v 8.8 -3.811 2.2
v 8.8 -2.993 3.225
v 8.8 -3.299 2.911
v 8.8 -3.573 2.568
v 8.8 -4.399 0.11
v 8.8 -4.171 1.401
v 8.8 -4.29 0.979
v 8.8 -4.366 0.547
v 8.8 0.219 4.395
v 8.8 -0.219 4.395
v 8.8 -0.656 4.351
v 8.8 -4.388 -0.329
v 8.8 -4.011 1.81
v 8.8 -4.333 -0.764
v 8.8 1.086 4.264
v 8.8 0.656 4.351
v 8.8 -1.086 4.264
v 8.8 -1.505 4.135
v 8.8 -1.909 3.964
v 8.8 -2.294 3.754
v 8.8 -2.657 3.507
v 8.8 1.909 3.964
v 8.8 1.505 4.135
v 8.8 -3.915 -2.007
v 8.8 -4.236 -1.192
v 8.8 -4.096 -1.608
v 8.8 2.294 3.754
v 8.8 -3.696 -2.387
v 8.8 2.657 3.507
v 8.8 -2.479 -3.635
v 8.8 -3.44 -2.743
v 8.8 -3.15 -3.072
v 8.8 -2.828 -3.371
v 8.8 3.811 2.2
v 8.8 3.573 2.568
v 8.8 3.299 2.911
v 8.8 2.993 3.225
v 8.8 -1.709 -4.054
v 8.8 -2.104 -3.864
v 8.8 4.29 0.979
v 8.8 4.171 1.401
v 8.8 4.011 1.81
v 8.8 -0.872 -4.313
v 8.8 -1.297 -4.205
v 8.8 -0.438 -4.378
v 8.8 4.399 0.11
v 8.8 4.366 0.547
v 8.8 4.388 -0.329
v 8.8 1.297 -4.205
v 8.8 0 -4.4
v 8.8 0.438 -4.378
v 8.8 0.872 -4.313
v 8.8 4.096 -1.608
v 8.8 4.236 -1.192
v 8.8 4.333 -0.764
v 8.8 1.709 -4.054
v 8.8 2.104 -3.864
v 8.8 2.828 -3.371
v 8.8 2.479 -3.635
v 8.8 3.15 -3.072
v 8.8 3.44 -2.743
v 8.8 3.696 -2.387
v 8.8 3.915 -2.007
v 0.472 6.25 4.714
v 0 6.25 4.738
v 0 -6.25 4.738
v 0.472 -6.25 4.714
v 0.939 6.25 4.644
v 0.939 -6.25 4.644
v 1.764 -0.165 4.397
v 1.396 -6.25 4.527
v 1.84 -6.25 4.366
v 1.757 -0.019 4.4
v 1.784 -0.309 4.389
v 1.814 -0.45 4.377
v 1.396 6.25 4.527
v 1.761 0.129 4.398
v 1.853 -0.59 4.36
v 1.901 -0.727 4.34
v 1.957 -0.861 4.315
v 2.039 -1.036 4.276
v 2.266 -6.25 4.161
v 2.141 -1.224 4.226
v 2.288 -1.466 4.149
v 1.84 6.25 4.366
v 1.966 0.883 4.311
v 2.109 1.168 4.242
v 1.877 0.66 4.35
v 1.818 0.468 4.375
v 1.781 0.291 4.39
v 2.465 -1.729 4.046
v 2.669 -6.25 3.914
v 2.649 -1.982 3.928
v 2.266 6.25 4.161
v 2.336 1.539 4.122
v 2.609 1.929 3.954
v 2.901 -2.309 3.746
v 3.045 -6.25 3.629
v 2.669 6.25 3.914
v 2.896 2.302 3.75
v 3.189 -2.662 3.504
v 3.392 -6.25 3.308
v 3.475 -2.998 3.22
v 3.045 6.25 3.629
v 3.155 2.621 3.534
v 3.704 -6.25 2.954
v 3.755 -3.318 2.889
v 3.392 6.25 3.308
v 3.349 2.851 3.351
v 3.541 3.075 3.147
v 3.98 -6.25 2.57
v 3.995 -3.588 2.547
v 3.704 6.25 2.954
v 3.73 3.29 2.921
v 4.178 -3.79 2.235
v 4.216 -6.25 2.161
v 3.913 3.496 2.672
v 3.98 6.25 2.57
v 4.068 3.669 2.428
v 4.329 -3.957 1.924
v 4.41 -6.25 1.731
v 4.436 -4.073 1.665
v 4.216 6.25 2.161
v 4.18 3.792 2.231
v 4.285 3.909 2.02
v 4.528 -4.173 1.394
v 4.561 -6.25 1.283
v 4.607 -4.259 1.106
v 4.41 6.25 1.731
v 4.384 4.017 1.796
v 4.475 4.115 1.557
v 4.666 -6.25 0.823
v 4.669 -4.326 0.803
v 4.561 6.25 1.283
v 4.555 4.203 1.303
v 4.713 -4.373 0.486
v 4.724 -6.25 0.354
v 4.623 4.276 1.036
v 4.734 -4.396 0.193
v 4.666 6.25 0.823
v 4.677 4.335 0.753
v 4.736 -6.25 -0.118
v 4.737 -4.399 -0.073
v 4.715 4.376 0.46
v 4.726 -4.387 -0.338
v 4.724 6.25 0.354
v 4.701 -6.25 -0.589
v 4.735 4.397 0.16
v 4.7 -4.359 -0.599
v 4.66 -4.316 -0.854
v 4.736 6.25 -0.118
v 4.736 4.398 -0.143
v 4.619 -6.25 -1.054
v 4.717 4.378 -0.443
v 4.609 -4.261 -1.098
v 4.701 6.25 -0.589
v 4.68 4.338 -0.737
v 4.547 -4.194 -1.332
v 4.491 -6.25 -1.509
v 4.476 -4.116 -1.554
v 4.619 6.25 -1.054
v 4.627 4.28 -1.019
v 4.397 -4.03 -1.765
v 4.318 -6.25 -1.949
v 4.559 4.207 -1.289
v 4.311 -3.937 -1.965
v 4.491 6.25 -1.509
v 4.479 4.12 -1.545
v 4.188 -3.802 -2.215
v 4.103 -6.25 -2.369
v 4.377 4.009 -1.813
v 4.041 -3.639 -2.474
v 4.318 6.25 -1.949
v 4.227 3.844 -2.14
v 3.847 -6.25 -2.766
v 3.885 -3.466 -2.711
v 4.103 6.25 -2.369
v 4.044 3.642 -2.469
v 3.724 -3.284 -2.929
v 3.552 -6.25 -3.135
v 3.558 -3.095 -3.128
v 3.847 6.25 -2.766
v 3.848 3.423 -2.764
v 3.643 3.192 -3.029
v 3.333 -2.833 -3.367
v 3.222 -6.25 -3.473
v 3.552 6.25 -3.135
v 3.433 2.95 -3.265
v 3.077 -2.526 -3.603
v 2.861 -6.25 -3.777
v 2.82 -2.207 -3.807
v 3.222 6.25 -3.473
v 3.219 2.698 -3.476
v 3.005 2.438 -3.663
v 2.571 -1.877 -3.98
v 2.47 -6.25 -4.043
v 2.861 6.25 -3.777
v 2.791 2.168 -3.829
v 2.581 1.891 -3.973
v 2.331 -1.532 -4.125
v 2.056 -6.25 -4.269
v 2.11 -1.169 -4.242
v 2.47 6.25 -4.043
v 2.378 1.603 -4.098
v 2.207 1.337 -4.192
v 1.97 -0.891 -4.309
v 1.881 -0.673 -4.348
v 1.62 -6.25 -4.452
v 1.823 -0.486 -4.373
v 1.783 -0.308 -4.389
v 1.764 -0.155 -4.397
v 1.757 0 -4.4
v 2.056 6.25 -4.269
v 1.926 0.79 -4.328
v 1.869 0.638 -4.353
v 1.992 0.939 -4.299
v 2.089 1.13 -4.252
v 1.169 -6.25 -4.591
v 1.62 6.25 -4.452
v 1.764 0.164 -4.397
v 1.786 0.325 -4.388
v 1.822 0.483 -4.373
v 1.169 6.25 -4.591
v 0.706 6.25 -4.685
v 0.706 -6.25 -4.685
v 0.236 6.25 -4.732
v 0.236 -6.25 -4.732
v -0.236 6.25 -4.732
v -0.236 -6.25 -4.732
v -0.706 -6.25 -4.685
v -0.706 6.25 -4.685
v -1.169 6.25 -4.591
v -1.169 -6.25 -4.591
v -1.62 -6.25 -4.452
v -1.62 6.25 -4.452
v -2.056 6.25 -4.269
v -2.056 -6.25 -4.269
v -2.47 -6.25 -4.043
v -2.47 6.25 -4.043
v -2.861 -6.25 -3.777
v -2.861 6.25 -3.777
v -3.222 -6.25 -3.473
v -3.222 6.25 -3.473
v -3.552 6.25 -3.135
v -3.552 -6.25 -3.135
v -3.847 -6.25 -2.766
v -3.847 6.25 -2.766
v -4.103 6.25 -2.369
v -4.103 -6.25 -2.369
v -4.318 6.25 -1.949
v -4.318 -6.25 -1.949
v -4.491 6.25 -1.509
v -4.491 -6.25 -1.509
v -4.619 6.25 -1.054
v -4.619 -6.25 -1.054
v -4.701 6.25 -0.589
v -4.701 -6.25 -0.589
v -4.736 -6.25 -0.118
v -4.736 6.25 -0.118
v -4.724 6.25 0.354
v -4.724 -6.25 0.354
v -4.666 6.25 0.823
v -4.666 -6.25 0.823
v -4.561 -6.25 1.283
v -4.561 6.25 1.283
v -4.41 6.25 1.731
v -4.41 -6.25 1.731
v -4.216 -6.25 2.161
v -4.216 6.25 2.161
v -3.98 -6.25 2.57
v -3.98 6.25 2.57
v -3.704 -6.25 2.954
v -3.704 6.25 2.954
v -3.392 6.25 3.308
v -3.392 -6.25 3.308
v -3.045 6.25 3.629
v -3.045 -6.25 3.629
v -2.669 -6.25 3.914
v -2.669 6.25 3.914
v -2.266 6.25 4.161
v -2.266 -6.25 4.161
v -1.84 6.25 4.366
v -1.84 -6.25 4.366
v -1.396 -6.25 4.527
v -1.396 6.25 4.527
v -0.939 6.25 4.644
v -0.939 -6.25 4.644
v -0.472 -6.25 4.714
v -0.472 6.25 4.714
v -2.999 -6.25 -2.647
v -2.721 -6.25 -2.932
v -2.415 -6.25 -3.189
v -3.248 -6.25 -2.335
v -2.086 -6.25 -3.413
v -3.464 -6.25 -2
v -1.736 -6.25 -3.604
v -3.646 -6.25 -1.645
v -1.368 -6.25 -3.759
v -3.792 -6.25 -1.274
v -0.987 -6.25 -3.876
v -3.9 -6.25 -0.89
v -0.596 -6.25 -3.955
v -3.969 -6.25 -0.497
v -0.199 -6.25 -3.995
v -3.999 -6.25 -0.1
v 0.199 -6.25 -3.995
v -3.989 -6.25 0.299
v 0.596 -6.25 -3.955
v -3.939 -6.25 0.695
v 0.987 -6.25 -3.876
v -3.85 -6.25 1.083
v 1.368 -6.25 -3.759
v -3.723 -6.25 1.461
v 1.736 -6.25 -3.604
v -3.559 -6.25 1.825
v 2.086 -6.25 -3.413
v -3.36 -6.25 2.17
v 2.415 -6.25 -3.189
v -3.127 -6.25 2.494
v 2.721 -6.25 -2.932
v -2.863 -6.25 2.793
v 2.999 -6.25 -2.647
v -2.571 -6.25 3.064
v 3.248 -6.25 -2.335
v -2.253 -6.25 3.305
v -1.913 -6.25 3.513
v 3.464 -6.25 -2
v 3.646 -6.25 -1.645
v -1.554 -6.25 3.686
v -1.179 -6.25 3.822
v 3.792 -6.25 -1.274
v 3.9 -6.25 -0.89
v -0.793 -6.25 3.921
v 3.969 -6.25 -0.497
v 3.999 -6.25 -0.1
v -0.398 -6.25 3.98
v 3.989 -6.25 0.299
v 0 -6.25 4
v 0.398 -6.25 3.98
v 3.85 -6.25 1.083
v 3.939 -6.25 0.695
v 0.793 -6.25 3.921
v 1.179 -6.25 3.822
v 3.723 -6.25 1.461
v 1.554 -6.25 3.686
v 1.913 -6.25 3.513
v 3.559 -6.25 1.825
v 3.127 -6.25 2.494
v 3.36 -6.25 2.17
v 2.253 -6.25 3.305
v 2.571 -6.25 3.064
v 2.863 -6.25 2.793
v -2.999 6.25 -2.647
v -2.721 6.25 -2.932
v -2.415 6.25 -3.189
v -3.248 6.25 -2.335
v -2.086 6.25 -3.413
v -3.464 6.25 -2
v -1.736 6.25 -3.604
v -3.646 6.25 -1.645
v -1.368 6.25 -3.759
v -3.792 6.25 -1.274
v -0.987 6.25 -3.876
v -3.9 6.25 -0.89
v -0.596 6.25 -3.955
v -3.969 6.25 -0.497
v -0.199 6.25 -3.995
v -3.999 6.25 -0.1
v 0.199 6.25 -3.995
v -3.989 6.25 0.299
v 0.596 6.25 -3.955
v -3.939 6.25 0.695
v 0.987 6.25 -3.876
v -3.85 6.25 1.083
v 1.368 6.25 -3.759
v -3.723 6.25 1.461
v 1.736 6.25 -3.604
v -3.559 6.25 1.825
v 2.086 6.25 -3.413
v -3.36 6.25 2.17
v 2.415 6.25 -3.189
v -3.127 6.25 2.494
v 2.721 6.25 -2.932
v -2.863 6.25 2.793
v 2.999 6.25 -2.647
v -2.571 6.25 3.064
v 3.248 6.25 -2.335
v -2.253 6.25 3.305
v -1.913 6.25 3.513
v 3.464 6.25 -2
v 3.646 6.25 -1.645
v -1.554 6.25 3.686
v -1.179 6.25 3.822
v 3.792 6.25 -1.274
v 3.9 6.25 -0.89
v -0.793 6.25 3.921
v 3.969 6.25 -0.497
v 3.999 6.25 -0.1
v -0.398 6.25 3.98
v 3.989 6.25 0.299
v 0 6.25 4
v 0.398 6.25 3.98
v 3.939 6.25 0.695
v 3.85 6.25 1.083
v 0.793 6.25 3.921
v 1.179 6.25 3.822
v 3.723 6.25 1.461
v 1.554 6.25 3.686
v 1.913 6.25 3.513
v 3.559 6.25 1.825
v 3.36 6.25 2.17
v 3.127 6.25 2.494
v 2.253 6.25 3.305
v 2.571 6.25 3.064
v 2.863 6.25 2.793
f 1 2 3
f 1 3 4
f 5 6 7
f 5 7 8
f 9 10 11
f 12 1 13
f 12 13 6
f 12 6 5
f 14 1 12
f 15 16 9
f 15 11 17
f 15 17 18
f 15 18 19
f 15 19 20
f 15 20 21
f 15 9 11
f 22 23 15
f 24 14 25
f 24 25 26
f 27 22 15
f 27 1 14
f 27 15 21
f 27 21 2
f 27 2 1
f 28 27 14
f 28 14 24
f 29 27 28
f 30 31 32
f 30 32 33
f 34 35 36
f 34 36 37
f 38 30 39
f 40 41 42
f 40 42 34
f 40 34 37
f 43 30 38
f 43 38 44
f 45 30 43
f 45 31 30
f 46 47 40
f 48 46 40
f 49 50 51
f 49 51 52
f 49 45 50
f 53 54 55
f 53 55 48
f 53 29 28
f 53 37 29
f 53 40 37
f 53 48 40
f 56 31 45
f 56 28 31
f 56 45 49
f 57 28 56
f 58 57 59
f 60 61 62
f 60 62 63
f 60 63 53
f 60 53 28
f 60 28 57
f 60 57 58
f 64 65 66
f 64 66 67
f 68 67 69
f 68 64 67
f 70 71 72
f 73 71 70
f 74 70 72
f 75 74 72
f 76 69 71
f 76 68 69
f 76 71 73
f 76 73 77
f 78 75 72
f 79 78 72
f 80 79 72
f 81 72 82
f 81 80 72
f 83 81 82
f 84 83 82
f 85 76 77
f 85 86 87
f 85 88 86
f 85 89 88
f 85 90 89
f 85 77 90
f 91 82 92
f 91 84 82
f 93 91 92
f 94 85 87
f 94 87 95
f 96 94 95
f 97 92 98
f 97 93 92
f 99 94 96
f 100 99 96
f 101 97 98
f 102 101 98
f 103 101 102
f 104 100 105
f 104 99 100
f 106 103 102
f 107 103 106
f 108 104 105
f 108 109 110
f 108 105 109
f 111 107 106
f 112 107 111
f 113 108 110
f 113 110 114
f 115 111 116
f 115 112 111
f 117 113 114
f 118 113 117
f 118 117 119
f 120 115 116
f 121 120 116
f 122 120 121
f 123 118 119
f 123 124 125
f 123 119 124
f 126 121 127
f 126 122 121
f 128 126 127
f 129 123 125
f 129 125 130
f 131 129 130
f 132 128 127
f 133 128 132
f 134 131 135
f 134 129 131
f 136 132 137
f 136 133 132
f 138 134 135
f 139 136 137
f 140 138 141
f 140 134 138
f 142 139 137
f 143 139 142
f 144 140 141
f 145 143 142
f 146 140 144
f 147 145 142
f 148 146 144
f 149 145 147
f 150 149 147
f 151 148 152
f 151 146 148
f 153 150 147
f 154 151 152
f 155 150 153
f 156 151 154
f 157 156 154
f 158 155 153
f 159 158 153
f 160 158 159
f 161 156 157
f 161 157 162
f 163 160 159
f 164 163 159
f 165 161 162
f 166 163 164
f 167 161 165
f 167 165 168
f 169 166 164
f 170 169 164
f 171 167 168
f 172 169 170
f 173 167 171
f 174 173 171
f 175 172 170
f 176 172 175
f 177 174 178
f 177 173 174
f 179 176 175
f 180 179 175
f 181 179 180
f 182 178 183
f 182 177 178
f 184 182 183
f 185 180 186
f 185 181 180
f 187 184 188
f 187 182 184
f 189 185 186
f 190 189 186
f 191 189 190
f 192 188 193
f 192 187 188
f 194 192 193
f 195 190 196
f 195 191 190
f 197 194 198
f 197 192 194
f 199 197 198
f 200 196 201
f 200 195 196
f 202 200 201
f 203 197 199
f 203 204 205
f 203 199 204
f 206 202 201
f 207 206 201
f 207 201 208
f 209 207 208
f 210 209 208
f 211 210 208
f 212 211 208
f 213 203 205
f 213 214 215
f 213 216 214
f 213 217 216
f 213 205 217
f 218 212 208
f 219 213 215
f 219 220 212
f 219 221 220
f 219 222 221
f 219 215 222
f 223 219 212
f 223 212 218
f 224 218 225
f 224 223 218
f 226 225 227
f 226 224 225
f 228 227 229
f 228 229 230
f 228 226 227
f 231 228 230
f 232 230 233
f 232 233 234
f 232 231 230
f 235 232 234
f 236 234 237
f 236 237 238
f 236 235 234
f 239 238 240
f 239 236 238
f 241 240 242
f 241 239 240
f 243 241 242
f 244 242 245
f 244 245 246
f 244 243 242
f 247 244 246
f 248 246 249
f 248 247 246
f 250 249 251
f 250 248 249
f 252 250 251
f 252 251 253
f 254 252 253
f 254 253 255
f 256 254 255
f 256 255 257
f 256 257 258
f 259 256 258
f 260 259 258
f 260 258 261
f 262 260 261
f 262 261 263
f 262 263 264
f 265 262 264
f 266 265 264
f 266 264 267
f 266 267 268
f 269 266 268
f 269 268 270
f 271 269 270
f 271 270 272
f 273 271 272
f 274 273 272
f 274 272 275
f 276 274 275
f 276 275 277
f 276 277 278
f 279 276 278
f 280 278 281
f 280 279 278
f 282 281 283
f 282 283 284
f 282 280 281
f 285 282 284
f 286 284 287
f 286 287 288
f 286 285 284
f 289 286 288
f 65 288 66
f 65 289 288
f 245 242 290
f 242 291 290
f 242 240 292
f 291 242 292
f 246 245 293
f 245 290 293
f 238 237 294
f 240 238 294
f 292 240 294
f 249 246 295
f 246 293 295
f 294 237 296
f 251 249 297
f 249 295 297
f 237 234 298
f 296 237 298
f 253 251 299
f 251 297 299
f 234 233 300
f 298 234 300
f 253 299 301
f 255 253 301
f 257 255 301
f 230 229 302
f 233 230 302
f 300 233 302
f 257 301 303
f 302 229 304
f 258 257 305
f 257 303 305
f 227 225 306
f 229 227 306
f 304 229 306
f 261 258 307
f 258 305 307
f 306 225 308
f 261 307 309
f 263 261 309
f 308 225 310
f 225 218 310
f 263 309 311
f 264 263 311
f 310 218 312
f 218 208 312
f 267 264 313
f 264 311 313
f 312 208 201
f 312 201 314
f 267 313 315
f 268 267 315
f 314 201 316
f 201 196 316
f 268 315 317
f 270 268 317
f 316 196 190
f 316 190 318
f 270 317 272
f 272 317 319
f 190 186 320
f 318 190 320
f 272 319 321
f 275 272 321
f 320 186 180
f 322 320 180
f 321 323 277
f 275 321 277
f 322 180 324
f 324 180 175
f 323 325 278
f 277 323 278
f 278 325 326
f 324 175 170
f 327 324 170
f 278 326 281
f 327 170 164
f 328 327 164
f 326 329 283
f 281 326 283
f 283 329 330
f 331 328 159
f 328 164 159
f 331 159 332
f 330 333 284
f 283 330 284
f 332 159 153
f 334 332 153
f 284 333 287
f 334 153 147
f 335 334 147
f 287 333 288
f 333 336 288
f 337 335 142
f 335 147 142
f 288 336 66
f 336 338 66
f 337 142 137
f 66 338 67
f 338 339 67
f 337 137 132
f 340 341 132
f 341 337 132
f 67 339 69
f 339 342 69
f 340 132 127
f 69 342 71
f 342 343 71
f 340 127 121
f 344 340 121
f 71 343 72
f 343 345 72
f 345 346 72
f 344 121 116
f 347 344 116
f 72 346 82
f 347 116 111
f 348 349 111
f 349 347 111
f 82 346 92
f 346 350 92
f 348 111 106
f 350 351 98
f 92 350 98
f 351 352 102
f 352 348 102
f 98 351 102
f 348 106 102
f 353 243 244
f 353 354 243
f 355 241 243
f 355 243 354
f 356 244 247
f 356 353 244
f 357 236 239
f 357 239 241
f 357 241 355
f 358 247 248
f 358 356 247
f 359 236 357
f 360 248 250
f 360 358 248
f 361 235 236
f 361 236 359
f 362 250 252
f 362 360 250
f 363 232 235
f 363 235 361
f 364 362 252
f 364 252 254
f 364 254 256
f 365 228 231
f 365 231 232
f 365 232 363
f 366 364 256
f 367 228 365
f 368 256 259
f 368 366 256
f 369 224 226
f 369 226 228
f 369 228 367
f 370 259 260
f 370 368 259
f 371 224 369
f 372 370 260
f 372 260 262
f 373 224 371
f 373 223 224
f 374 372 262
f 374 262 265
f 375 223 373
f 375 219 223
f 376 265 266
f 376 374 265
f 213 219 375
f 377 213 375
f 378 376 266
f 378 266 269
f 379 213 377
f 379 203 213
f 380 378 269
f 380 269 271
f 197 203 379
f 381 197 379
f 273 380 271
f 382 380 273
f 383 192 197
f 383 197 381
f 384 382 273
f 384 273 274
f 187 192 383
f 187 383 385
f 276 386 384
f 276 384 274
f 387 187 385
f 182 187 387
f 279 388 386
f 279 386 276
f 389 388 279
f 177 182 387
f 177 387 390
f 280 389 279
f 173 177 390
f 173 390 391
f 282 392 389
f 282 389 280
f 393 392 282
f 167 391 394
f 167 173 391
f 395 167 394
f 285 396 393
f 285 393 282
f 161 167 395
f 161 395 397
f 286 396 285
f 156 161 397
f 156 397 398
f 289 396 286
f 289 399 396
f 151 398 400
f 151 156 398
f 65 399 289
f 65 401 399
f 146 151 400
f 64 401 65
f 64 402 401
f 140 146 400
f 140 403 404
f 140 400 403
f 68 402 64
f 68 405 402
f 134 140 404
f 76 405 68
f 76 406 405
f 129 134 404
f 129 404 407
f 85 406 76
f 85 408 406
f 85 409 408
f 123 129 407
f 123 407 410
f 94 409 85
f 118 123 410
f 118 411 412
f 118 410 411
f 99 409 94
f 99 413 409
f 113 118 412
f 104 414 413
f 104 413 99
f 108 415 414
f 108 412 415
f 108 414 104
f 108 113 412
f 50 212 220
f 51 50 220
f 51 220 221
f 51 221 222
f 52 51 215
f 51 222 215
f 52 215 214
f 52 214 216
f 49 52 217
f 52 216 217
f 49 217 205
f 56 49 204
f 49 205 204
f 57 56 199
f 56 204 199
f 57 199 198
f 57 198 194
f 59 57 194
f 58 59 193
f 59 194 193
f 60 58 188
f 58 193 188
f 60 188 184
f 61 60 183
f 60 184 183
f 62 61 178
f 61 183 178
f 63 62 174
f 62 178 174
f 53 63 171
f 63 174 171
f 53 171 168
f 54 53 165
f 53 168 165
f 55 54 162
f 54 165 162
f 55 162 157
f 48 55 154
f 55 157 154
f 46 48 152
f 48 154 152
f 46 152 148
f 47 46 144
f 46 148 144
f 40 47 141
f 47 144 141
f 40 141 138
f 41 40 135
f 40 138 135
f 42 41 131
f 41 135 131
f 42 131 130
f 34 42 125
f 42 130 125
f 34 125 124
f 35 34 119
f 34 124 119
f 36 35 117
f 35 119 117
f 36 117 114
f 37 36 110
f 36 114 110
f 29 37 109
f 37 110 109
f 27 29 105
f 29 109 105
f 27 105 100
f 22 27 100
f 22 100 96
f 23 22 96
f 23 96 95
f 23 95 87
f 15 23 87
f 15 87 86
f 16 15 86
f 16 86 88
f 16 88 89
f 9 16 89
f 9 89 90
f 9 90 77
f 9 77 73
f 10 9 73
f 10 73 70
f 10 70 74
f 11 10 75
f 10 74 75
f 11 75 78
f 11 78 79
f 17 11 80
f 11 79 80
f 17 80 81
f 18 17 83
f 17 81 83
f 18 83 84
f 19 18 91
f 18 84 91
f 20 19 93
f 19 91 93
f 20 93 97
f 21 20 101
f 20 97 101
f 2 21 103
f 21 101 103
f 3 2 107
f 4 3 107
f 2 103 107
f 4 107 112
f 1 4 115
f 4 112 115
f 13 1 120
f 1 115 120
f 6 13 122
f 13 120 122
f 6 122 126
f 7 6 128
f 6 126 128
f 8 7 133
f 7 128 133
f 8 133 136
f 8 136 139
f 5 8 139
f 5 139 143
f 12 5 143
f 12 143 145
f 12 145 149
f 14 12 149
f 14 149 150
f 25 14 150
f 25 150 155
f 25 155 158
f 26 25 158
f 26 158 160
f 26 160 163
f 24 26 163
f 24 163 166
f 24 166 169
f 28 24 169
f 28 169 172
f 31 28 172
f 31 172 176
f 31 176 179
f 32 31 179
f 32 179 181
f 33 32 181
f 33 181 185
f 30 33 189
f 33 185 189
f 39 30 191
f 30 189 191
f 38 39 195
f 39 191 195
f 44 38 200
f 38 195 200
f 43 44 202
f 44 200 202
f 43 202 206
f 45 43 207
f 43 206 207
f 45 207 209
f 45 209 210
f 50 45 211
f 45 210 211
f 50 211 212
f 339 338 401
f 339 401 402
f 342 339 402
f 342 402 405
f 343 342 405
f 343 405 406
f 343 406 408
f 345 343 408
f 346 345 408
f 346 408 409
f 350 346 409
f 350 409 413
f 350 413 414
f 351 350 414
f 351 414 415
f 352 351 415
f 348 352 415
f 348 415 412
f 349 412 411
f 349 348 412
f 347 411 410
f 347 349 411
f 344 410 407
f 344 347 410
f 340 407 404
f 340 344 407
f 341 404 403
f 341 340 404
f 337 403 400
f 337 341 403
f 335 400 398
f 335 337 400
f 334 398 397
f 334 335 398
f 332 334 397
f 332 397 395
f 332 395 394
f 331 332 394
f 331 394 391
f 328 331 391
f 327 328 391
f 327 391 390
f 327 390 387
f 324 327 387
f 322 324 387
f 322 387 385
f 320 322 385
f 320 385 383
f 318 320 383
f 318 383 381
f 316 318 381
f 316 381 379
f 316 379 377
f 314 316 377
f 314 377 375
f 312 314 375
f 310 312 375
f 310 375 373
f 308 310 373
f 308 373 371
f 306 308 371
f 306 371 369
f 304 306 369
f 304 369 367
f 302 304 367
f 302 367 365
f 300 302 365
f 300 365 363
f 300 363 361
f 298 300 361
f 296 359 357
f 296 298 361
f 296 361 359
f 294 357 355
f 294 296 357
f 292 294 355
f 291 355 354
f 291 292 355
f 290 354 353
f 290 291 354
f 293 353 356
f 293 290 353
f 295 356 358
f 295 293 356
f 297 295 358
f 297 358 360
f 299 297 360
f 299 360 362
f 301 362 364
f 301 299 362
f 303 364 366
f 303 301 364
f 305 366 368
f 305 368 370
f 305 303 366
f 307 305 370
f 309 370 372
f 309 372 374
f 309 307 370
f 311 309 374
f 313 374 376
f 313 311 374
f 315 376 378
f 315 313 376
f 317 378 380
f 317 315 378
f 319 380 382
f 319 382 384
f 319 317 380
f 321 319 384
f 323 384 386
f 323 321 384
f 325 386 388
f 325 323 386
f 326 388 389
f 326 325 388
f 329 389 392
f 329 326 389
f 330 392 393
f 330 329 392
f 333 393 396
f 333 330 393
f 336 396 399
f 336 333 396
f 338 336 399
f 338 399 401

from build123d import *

# Parameters (mm, degrees)
SKETCH1_R               = 4.4
BOSS_EXTRUDE1_DEPTH     = 8.8
SKETCH2_R               = 4.737731287
SKETCH2_R_2             = 4
BOSS_EXTRUDE2_DEPTH     = 6.25
CUT_EXTRUDE1_DEPTH      = 12.787646148
CUT_EXTRUDE1_DEPTH_BACK = 12.787646148
SKETCH3_R               = 4


with BuildPart() as part:
    # Sketch1 → Boss-Extrude1 (new body)
    with BuildSketch(Plane.YZ):
        with Locations(Location((0, 0, 0), (0, 0, 270))):
            Circle(SKETCH1_R)
    extrude(amount=BOSS_EXTRUDE1_DEPTH)

    # Sketch2 → Boss-Extrude2 (add, symmetric)
    with BuildSketch(Plane(origin=(0, 0, 0), x_dir=(-1, 0, 0), z_dir=(0, 1, 0))):
        with Locations(Location((0, 0, 0), (0, 0, 90))):
            Circle(SKETCH2_R)
        with Locations(Location((0, 0, 0), (0, 0, 90))):
            Circle(SKETCH2_R_2, mode=Mode.SUBTRACT)
    extrude(amount=BOSS_EXTRUDE2_DEPTH, both=True)

    # Sketch3 → Cut-Extrude1 (cut, two sides: drawn at the far end of the back side and taken through both)
    with BuildSketch(Plane(origin=(0, 0, 0), x_dir=(-1, 0, 0), z_dir=(0, 1, 0)).offset(-CUT_EXTRUDE1_DEPTH_BACK)):
        with Locations(Location((0, 0, 0), (0, 0, 90))):
            Circle(SKETCH3_R)
    extrude(amount=CUT_EXTRUDE1_DEPTH + CUT_EXTRUDE1_DEPTH_BACK, mode=Mode.SUBTRACT)


solid = part.part
